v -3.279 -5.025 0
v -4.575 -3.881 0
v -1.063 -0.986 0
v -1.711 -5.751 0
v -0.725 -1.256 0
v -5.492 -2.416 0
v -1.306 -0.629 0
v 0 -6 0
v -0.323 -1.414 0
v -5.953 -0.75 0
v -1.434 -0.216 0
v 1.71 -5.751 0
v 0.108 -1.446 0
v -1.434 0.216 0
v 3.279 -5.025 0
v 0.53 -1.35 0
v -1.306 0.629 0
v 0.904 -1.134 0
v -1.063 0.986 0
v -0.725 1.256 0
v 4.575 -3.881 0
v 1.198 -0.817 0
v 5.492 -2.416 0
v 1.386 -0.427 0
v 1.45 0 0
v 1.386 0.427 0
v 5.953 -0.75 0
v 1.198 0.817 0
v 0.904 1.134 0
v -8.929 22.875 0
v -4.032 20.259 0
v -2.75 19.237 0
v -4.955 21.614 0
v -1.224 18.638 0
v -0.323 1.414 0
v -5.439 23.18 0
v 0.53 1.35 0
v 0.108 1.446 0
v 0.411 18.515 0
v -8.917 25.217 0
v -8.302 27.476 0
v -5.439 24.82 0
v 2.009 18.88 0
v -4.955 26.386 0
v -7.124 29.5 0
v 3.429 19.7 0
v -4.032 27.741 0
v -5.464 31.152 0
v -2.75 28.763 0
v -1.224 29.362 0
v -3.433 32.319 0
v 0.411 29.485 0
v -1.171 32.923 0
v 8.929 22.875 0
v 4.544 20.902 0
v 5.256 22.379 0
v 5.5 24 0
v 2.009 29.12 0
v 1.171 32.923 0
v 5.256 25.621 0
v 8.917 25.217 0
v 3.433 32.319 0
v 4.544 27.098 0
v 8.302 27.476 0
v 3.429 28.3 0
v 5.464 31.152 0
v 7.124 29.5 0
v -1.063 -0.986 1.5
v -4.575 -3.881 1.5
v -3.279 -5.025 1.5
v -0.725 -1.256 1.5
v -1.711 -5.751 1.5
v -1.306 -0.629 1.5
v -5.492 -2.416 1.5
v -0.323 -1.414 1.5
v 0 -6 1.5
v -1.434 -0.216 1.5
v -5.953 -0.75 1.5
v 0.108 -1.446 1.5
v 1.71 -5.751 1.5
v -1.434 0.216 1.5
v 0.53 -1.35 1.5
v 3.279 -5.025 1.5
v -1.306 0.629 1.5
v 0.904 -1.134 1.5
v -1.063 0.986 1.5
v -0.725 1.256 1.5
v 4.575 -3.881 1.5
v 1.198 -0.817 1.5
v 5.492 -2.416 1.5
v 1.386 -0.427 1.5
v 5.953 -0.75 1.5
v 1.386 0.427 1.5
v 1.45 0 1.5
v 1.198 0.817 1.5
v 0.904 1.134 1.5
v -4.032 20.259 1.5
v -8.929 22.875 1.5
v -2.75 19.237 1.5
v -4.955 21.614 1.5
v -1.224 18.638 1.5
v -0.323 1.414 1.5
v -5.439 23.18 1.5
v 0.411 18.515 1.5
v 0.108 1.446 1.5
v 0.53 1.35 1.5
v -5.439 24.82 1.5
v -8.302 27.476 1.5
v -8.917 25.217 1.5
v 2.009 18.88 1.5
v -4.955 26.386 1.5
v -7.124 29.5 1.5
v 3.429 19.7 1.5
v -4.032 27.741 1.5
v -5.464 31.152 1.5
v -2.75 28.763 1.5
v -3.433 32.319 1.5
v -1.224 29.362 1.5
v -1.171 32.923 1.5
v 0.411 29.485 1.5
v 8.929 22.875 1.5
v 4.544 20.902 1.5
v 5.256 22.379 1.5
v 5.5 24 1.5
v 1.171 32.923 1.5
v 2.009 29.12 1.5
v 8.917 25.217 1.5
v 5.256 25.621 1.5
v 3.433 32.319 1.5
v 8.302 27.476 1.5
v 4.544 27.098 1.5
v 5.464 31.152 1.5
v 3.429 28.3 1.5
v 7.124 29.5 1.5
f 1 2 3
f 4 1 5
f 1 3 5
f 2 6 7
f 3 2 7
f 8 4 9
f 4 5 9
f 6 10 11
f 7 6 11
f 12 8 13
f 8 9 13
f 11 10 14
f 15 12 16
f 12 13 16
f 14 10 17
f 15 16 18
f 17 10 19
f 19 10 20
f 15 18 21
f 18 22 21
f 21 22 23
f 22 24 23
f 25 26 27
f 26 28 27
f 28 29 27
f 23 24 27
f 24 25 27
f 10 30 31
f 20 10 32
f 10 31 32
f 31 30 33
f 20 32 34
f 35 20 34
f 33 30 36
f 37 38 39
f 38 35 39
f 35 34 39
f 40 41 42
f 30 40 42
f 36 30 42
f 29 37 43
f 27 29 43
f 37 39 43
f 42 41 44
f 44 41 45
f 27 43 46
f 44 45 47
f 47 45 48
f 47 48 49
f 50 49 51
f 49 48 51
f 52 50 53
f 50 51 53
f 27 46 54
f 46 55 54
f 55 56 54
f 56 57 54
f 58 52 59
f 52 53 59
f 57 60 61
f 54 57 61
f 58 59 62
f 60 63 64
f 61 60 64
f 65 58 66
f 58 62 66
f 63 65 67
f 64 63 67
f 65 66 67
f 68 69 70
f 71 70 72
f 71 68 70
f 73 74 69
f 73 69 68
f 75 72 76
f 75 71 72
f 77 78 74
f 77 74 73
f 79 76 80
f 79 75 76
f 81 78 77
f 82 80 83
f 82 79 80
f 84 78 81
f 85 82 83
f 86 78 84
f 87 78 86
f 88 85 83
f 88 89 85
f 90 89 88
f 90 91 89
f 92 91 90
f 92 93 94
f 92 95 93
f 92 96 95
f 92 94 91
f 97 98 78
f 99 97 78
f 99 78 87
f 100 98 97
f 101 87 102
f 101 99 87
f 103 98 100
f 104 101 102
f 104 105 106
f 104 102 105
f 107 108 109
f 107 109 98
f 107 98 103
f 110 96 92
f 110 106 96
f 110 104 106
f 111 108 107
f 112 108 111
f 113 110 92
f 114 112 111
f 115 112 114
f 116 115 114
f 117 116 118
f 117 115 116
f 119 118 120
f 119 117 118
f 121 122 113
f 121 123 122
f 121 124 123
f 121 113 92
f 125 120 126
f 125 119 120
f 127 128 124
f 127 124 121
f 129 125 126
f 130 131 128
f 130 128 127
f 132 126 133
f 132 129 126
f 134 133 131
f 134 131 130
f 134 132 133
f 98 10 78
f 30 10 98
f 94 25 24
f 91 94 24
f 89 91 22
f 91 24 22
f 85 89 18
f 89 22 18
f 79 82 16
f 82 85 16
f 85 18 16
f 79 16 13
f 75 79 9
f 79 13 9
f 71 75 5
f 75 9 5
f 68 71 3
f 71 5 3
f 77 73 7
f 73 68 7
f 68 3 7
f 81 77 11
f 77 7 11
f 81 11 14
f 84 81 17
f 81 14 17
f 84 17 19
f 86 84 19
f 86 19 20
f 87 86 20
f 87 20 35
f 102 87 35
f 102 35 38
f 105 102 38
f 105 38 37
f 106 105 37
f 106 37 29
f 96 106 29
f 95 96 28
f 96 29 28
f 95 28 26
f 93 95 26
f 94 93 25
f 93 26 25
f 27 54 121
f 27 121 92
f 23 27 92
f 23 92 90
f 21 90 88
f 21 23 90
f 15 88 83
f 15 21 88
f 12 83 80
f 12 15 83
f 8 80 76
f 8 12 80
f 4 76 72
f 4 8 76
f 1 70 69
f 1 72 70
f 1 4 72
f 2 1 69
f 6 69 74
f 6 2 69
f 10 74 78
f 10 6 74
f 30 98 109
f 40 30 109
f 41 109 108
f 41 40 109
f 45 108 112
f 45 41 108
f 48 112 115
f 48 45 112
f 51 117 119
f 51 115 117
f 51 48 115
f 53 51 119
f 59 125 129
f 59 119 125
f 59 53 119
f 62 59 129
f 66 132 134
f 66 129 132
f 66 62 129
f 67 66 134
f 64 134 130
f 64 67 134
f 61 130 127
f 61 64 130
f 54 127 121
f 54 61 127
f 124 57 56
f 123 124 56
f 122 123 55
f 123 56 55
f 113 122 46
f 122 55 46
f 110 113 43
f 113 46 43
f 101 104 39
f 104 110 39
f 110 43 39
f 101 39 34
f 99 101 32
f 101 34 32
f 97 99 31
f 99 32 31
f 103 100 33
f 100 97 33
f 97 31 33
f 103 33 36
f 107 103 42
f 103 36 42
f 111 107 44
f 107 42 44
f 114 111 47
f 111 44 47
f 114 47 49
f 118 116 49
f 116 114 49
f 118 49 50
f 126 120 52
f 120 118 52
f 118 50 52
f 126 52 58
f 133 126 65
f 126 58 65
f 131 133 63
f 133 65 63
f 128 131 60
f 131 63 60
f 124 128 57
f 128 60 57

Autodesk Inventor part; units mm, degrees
ref_plane "YZ Plane" through (0, 0, 0) normal (1, 0, 0) x (0, 1, 0)
ref_plane "XZ Plane" through (0, 0, 0) normal (0, 1, 0) x (-1, 0, 0)
ref_plane "XY Plane" through (0, 0, 0) normal (0, 0, 1) x (1, 0, 0)
sketch "Sketch1" plane through (0, 0, 0) normal (0, 0, 1) x (1, 0, 0)
  circle A0 centre (0, 0) radius 1.45
  line L0 (0, 0) -> (-32, 0) construction
  arc A1 (-6, 0) -> (5.9529, -0.75) centre (0, 0) ccw
  circle A2 centre (0, 24) radius 5.5
  arc A3 (8.9294, 22.875) -> (-8.9294, 22.875) centre (0, 24) ccw
  line L1 (8.9294, 22.875) -> (5.9529, -0.75)
  line L2 (-5.9529, -0.75) -> (-8.9294, 22.875)
  dimension "d0" = 2.9
  dimension "d61" = 6
  dimension "d63" = 24
  dimension "d69" = 9
  dimension "d72" = 11
extrude "Extrusion1" add sketch "Sketch1" along normal blind 1.5
properties part number "tipper_link_B_support"
